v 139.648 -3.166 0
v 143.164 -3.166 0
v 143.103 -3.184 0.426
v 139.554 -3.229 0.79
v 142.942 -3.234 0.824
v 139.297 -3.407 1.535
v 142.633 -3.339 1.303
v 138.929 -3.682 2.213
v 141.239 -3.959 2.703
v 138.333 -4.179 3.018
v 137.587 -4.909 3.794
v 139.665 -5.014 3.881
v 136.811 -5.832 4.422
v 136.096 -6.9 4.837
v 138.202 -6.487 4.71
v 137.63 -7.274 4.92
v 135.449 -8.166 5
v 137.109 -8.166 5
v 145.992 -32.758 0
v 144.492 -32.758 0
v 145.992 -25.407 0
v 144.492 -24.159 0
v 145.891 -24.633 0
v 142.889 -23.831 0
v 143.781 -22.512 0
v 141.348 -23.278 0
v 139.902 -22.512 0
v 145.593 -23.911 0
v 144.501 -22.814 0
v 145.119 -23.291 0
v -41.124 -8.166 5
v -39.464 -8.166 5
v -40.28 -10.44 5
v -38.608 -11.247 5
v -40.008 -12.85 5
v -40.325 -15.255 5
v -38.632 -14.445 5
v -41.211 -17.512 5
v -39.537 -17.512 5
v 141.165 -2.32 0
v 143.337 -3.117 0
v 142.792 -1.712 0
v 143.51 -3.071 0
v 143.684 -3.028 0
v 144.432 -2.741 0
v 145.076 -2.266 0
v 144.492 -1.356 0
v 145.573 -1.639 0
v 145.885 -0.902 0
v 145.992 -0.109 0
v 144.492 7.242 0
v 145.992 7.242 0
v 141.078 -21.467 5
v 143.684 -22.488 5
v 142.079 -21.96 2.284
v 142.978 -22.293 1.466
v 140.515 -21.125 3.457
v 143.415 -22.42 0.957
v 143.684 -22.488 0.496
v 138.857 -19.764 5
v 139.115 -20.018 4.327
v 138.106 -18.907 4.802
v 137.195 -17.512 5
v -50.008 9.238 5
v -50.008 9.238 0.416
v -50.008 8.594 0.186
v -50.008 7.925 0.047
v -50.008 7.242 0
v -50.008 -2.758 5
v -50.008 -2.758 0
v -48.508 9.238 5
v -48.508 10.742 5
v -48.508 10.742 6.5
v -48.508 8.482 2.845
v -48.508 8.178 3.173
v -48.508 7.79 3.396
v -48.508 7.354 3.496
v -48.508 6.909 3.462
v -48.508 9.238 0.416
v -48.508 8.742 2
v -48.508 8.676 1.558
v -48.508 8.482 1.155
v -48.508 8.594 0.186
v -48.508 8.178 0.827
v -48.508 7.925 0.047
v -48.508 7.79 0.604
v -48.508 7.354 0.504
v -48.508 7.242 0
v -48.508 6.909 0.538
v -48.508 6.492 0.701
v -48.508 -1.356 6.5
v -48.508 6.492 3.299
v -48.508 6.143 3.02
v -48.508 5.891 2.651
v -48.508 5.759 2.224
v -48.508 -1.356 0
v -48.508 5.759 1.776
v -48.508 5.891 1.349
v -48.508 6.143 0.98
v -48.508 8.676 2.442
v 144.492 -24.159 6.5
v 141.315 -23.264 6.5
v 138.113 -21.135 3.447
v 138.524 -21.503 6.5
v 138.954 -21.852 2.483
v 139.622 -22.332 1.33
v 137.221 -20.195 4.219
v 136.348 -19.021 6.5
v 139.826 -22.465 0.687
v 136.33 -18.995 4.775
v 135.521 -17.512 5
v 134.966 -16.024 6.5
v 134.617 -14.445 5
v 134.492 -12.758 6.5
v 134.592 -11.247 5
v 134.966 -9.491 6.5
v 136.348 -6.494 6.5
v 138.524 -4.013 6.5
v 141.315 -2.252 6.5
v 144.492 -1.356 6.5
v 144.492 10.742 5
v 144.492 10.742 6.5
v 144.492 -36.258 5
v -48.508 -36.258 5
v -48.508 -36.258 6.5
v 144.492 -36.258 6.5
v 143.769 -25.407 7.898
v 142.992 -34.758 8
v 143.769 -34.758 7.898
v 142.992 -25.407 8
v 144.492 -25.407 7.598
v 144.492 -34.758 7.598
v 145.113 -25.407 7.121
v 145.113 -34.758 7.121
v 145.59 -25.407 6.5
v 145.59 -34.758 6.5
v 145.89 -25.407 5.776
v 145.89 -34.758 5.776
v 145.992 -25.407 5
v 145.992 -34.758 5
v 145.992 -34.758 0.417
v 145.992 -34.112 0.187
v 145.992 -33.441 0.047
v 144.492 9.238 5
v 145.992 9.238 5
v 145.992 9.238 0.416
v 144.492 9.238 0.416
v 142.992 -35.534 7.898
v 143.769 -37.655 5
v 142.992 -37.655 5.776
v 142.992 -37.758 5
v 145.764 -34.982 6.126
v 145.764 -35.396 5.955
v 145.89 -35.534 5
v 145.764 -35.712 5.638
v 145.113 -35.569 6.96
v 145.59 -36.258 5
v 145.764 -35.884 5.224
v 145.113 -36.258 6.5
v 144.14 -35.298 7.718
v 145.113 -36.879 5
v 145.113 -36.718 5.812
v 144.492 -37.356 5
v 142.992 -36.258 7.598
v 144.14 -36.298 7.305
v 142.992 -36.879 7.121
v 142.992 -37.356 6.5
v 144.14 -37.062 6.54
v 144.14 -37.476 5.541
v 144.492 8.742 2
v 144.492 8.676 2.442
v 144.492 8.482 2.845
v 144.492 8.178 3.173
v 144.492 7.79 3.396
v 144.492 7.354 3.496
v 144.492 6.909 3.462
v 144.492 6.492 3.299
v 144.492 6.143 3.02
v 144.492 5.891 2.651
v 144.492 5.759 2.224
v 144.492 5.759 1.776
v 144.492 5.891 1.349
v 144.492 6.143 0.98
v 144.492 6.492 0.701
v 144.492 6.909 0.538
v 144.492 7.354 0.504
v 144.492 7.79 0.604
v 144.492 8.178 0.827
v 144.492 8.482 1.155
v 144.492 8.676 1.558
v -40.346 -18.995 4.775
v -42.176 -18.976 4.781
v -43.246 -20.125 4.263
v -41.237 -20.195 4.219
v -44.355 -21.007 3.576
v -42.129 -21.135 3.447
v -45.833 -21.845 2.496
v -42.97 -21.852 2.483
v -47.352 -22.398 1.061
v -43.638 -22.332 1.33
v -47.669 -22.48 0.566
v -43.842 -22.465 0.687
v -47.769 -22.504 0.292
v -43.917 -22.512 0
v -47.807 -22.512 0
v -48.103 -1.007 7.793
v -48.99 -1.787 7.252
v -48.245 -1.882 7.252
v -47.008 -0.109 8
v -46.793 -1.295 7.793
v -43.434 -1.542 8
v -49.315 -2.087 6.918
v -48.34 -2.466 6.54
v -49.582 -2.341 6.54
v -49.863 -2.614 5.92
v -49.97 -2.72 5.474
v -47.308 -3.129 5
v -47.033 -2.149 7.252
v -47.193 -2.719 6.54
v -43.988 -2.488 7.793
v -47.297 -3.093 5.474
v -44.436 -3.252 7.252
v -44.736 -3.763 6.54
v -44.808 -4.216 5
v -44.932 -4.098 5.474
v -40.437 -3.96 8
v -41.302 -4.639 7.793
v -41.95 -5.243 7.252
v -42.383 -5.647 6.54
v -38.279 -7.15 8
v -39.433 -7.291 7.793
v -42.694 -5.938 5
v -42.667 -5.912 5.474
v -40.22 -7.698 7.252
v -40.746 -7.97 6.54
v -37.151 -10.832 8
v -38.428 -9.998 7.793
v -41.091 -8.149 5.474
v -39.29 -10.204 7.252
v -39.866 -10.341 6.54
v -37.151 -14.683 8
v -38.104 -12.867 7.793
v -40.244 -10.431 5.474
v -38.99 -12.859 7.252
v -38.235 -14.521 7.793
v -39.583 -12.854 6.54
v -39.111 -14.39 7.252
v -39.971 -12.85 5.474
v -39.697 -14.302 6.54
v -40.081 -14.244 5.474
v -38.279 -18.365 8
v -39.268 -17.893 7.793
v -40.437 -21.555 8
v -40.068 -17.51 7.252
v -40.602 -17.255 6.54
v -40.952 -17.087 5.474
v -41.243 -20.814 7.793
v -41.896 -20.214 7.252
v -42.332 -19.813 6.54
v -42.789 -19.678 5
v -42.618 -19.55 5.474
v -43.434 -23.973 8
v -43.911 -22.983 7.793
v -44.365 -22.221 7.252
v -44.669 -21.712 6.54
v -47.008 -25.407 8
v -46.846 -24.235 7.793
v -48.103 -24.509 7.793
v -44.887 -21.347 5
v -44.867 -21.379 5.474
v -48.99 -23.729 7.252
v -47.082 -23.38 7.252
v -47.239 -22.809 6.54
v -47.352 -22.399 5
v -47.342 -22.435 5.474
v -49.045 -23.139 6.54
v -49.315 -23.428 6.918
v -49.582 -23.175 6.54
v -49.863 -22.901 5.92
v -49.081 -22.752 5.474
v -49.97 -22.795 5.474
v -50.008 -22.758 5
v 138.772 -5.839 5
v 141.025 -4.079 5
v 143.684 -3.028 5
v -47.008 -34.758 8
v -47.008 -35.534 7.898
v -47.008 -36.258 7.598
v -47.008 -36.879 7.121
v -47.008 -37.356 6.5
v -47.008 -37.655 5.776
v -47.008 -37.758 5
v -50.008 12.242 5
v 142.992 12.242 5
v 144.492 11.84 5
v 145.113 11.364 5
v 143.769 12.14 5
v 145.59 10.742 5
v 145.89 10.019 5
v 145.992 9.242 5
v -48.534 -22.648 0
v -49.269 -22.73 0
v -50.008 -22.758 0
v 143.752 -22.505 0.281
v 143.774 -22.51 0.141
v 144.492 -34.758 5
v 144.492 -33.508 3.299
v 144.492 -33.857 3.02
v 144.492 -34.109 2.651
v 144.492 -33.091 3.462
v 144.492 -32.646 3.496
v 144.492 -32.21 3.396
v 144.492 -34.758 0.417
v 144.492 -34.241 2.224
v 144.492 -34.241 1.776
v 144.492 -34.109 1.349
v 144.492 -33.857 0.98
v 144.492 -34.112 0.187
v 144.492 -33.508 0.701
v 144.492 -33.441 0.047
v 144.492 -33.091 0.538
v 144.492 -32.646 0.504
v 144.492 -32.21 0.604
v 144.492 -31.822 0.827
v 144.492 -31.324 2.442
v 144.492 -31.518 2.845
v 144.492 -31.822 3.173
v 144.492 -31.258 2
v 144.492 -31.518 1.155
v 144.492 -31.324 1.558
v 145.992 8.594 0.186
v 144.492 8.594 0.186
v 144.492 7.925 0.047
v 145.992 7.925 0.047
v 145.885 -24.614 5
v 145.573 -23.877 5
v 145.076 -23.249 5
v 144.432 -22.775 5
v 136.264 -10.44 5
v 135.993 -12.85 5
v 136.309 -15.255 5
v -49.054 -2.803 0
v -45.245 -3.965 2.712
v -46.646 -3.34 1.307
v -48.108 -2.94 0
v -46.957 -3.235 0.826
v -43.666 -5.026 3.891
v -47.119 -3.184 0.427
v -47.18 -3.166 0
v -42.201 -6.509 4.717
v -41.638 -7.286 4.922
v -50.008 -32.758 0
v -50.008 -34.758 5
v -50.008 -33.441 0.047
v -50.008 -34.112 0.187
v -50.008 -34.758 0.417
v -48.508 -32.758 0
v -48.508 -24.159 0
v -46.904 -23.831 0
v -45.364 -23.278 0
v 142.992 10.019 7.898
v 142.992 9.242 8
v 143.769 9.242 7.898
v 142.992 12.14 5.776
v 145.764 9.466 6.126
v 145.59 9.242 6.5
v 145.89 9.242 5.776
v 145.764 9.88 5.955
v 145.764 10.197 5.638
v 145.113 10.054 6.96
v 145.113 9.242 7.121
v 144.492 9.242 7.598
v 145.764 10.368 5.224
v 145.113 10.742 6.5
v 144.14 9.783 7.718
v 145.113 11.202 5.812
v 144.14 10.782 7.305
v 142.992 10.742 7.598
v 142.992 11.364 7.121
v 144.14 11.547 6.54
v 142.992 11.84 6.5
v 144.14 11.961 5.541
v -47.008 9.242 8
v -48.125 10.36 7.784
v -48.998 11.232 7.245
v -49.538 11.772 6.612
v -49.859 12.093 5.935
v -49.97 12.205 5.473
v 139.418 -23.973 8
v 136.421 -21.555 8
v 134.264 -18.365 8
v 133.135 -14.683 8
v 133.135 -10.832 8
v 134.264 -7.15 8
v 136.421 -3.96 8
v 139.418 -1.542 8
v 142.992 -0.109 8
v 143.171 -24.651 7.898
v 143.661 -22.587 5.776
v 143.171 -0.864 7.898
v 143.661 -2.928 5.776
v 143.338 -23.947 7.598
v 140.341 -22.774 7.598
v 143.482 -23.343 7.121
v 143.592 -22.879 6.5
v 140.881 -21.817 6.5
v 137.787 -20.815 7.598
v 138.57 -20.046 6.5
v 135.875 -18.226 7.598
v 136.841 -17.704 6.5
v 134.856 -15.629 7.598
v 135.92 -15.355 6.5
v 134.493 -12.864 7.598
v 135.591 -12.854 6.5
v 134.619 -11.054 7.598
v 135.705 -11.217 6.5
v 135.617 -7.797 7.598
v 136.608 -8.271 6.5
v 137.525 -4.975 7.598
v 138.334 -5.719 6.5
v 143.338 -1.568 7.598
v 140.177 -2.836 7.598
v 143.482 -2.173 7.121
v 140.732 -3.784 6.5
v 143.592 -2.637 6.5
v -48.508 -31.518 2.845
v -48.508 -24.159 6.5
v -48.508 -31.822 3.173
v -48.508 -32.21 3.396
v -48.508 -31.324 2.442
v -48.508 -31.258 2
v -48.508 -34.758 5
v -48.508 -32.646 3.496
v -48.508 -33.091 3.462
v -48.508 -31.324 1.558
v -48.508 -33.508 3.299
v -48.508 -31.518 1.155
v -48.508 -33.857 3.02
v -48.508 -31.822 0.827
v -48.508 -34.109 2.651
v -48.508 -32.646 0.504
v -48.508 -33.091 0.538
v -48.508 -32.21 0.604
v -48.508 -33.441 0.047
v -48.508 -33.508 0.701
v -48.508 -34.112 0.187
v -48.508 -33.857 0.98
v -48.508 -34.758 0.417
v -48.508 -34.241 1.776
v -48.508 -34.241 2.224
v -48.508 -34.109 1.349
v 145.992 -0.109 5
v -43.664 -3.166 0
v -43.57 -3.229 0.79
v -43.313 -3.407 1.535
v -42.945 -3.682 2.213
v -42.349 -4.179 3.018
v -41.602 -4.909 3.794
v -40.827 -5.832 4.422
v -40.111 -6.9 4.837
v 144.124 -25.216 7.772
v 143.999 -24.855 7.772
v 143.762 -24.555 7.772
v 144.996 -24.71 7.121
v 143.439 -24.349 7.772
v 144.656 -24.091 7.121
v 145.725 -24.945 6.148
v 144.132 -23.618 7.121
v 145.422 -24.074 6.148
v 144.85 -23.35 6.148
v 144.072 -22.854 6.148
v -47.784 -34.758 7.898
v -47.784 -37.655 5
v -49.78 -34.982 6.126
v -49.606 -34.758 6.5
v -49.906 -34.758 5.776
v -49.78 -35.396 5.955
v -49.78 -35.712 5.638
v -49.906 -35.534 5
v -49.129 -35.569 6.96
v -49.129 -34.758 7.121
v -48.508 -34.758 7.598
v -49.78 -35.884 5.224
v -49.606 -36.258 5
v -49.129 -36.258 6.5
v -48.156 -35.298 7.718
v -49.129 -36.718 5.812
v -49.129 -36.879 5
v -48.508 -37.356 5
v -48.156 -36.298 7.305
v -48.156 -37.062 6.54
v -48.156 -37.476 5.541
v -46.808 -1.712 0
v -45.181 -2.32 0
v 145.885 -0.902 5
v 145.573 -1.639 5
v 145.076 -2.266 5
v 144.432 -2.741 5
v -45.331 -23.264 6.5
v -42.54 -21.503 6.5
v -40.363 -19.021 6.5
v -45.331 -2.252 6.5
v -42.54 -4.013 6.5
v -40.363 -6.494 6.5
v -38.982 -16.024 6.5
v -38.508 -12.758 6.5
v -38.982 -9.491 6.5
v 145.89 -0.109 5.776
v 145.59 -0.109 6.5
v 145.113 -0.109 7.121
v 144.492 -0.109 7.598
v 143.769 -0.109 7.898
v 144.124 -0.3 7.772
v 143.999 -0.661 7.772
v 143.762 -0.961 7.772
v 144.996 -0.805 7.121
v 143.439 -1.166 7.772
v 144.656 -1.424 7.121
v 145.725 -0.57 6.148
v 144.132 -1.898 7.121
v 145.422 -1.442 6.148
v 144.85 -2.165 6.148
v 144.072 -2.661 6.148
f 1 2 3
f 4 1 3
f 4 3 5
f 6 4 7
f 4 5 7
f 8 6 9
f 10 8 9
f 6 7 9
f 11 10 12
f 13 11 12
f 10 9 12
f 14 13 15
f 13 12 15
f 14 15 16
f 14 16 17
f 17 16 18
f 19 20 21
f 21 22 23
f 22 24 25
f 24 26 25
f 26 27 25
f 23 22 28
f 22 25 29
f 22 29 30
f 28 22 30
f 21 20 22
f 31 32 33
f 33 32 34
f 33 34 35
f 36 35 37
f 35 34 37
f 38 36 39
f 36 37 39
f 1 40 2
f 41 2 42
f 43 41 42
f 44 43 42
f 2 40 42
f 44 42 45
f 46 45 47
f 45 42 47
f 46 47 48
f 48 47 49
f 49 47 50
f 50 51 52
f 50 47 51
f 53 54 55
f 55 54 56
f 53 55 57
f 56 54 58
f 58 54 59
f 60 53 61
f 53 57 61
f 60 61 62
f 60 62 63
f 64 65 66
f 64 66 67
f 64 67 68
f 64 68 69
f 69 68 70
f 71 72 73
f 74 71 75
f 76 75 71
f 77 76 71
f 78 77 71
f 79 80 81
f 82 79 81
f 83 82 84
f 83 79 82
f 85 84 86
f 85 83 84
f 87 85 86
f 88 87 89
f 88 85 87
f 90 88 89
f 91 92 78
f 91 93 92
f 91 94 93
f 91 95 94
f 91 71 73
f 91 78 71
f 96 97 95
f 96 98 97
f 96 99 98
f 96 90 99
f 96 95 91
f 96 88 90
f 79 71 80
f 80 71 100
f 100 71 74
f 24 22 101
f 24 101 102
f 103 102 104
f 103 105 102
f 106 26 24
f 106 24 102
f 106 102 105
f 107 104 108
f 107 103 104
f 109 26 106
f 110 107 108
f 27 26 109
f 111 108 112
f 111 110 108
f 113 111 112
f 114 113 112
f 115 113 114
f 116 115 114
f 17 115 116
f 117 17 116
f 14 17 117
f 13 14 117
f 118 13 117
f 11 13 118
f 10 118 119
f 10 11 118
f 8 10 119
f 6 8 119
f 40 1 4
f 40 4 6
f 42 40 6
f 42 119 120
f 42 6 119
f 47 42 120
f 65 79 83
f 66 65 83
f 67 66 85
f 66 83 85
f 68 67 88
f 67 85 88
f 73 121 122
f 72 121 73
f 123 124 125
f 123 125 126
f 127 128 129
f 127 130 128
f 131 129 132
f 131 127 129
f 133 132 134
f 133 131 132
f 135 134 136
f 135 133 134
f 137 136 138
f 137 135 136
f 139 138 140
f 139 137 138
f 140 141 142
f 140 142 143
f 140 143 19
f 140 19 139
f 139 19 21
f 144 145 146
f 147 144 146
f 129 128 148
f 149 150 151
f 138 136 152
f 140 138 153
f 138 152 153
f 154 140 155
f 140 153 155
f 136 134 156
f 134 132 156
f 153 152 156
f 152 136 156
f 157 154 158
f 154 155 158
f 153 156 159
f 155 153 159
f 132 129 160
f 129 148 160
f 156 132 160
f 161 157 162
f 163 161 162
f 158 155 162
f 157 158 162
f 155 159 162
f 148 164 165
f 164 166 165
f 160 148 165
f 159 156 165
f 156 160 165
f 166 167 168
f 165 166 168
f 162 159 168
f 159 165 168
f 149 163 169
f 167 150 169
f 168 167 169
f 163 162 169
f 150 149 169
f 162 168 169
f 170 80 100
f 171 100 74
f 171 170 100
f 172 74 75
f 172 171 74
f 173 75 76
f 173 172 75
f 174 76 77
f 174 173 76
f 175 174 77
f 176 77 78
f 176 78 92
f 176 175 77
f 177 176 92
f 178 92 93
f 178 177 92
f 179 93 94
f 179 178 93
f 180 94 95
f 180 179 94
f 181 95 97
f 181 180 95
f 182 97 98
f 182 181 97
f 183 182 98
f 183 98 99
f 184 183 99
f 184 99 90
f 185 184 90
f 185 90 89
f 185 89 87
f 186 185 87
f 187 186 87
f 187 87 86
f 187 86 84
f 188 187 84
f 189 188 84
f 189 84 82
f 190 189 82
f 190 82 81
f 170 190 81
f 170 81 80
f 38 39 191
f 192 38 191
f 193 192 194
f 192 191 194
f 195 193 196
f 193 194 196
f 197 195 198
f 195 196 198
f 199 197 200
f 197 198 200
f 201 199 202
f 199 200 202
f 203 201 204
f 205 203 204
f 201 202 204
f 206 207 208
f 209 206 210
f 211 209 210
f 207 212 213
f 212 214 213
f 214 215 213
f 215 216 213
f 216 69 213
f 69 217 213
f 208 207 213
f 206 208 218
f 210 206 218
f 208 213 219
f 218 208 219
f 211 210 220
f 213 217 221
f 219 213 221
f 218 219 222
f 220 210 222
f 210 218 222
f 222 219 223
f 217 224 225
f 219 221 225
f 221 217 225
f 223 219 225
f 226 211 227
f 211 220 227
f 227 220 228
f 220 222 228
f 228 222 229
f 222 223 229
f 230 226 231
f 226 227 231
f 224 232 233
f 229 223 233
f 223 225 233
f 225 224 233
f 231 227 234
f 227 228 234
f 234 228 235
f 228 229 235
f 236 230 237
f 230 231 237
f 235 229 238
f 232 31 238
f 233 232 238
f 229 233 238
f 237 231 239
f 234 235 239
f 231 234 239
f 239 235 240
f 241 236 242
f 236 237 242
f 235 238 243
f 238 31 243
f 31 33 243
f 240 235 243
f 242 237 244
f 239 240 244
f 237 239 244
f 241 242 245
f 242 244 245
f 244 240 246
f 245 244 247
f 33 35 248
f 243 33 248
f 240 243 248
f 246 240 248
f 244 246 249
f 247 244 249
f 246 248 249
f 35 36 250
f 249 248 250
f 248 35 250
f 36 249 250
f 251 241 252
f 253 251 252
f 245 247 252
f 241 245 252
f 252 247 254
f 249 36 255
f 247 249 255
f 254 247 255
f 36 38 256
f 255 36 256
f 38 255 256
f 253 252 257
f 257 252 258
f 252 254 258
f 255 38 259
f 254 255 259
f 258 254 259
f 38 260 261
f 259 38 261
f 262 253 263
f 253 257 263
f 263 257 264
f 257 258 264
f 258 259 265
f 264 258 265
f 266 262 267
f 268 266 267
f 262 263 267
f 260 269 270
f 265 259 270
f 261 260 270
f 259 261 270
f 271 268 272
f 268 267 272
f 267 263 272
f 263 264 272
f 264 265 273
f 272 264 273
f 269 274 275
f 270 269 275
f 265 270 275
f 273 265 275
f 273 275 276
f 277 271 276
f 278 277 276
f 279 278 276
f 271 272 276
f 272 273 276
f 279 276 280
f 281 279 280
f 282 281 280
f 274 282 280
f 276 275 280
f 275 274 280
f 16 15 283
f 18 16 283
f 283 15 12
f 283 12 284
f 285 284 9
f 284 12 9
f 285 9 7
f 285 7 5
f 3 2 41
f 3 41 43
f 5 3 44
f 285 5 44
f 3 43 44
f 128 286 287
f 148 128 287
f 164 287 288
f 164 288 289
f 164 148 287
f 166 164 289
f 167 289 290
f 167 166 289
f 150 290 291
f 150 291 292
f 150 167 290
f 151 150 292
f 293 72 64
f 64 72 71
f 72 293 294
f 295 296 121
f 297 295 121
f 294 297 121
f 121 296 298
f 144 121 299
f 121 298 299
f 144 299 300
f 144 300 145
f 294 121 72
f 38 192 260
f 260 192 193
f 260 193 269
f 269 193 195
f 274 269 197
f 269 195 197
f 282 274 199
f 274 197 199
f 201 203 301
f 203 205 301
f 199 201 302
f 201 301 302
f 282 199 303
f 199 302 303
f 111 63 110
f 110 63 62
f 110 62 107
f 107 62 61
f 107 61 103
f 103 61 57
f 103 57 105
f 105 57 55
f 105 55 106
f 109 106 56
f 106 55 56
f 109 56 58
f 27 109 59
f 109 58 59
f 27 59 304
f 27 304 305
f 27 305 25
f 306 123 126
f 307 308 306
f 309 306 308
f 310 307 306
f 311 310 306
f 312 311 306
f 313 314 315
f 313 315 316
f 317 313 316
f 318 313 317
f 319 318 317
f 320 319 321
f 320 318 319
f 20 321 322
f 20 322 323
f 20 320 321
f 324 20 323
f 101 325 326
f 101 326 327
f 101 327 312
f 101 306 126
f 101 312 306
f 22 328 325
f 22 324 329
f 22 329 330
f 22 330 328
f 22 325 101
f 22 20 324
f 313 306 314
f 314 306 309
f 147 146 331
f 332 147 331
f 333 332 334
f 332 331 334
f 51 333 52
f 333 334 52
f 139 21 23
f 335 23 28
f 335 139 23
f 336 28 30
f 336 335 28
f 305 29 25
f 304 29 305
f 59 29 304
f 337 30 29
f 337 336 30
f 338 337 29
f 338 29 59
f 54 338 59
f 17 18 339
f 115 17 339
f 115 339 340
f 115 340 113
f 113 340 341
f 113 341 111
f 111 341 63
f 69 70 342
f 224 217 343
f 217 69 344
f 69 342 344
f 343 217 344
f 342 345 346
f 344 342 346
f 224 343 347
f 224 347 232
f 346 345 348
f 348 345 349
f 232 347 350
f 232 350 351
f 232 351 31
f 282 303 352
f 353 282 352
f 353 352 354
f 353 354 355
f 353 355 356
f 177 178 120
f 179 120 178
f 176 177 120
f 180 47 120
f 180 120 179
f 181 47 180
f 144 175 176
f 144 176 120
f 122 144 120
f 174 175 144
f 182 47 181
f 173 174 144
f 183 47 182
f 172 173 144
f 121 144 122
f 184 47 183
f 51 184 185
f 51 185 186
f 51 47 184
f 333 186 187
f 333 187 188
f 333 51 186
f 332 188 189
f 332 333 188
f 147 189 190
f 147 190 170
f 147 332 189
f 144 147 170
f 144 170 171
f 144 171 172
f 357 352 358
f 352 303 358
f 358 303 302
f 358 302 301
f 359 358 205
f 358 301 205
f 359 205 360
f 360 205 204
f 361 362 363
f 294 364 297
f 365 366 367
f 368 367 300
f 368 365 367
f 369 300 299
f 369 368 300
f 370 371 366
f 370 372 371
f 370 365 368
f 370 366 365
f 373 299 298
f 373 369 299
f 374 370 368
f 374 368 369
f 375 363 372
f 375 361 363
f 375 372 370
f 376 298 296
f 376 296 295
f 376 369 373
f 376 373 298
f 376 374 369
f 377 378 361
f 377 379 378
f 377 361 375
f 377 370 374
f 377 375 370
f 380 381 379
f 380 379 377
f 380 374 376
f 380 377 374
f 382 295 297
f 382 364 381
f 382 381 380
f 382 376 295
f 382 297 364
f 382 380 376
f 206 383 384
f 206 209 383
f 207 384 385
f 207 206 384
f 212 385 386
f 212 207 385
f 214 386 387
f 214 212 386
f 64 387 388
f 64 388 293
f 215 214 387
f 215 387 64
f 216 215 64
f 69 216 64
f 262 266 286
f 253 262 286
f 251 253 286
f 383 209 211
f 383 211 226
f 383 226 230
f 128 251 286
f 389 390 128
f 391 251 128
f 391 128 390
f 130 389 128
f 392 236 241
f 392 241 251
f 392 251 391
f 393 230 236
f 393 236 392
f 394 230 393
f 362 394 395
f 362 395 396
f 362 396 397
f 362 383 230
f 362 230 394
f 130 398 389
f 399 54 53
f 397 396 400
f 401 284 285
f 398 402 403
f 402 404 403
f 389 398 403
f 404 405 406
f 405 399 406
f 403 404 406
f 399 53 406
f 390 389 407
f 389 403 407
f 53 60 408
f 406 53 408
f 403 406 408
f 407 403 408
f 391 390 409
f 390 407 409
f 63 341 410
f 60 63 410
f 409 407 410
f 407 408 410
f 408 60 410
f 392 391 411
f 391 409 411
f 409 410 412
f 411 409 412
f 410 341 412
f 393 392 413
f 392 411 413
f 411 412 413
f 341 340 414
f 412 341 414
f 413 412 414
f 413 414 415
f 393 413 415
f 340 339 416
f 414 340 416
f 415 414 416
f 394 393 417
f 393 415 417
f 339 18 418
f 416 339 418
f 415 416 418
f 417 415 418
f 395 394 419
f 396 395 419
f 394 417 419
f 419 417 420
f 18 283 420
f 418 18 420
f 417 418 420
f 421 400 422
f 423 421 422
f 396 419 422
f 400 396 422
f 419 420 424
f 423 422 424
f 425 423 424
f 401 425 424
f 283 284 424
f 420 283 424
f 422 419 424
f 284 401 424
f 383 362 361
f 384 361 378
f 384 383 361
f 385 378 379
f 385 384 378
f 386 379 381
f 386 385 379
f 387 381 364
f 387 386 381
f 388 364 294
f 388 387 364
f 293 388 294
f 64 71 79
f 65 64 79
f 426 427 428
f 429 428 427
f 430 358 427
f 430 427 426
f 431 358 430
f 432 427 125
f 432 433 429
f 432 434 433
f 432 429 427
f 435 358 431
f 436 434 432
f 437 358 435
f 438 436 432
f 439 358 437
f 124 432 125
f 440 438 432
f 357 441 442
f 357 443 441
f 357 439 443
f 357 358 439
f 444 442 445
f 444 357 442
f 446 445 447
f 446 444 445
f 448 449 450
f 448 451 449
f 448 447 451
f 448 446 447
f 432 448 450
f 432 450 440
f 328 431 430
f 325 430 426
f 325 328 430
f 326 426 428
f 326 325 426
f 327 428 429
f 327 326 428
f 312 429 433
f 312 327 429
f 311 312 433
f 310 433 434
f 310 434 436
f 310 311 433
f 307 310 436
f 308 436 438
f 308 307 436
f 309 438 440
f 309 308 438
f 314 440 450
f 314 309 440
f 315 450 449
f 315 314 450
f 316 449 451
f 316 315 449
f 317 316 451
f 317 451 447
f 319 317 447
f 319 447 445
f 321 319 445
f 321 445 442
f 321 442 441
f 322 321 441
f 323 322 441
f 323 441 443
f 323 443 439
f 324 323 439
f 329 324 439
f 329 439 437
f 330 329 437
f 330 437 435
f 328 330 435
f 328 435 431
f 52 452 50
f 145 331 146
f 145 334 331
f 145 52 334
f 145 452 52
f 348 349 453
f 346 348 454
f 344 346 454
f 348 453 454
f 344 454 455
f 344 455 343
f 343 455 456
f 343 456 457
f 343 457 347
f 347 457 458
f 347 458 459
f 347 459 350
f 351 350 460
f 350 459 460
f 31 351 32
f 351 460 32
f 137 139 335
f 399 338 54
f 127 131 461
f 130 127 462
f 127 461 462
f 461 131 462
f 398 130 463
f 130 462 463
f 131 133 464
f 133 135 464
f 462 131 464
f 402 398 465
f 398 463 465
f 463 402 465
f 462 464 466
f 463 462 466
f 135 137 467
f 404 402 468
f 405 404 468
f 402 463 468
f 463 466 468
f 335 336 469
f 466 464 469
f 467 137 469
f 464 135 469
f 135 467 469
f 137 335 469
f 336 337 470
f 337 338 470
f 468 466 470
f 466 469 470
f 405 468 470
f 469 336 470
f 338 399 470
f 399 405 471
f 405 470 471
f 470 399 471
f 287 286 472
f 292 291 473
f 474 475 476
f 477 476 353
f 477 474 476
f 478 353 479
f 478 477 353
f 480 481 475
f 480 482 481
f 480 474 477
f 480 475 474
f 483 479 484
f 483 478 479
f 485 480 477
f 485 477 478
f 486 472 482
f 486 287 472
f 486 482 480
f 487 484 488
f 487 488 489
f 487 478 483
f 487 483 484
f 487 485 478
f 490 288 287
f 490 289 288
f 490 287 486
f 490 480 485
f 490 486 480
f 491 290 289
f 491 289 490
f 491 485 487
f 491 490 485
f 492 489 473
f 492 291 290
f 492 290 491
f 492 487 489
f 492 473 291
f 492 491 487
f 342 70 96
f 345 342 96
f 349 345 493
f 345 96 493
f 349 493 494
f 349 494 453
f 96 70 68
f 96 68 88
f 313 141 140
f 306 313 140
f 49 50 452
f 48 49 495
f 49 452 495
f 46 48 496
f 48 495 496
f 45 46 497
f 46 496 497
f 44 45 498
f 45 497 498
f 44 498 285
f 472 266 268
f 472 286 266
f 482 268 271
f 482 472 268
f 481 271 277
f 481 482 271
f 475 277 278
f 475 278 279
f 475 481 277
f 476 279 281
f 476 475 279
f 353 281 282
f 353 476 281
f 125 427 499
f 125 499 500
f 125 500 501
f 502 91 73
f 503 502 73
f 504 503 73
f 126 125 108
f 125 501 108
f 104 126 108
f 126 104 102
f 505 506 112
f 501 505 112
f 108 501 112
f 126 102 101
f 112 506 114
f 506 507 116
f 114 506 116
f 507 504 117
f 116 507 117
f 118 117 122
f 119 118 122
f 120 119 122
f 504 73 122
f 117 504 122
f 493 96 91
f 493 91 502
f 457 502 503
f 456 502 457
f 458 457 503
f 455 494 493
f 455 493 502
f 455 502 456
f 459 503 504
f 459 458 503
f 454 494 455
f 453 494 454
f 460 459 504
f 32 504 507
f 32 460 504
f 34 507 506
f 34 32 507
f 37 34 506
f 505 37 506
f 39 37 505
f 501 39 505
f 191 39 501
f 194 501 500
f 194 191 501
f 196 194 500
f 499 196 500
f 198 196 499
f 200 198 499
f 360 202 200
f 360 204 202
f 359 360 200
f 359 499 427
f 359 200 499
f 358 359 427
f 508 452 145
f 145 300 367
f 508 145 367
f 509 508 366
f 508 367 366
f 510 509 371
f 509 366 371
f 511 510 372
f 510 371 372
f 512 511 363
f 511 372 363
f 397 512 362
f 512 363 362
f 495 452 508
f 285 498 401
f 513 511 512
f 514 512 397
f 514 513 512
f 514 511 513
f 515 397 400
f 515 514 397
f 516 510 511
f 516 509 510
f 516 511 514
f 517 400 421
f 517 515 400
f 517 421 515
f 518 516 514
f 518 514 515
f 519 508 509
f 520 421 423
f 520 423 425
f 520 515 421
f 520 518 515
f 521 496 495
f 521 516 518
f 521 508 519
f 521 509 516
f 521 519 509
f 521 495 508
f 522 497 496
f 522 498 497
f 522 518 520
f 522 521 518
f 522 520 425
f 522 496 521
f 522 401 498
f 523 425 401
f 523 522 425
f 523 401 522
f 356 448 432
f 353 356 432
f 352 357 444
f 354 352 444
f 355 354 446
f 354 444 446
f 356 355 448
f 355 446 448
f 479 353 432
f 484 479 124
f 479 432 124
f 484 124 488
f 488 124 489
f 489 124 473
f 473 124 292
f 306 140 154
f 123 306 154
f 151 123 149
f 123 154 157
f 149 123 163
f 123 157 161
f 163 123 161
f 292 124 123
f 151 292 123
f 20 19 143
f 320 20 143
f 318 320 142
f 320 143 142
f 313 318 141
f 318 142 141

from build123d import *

# Parameters (mm, degrees)
F1_DEPTH  = 8
F3_T      = -1.5
F2_R      = 1.5
F4_DEPTH  = 196
F6_DEPTH  = 196.001
F7_R      = 3
F9_DEPTH  = 196.001
F11_DEPTH = 196.001


with BuildPart() as f1:
    # F0 (on Top) → F1 (new body)
    with BuildSketch(Plane.XY):
        with BuildLine():
            Line((145.992111, 12.24232), (-50.007889, 12.24232))
            Line((-50.007889, 12.24232), (-50.007889, -2.75768))
            ThreePointArc((-50.007889, -2.75768), (-40.007889, -12.75768), (-50.007889, -22.75768))
            Line((-50.007889, -22.75768), (-50.007889, -37.75768))
            Line((-50.007889, -37.75768), (145.992111, -37.75768))
            Line((145.992111, -37.75768), (145.992111, -22.75768))
            ThreePointArc((145.992111, -22.75768), (135.992111, -12.75768), (145.992111, -2.75768))
            Line((145.992111, -2.75768), (145.992111, 12.24232))
        make_face()
    extrude(amount=F1_DEPTH)

    # F3
    f3_openings = [f1.faces().sort_by_distance(p)[0] for p in [
        (47.992111, -12.75768, 0),
    ]]
    offset(amount=F3_T, openings=f3_openings)

    # F2 (on face) → F4 (join, through all)
    with BuildSketch(Plane.YZ.offset(145.992111)):
        with Locations((7.24232, 2)):
            Circle(F2_R)
        with Locations((-32.75768, 2)):
            Circle(F2_R)
    extrude(amount=-F4_DEPTH)

    # F5 (on face) → F6 (cut, through all)
    with BuildSketch(Plane(origin=(-50.007889, 0, 0), x_dir=(0, -1, 0), z_dir=(-1, 0, 0))):
        with BuildLine():
            ThreePointArc((-15.24232, 1.255437), (-17.447156, 3.75963), (-18.24232, 7))
            Line((-18.24232, 7), (-18.24232, 0.071797))
            ThreePointArc((-18.24232, 0.071797), (-16.673224, 0.488491), (-15.24232, 1.255437))
        make_face()
        with BuildLine():
            ThreePointArc((-12.24232, 7), (-13.037483, 3.75963), (-15.24232, 1.255437))
            ThreePointArc((-15.24232, 1.255437), (-13.811415, 0.488491), (-12.24232, 0.071797))
            Line((-12.24232, 0.071797), (-12.24232, 7))
        make_face()
        with BuildLine():
            ThreePointArc((-12.24232, 0.071797), (-13.811415, 0.488491), (-15.24232, 1.255437))
            ThreePointArc((-15.24232, 1.255437), (-16.673224, 0.488491), (-18.24232, 0.071797))
            Line((-18.24232, 0.071797), (-18.24232, 0))
            Line((-18.24232, 0), (-12.24232, 0))
            Line((-12.24232, 0), (-12.24232, 0.071797))
        make_face()
        with BuildLine():
            Line((-18.24232, 0), (-18.24232, 0.071797))
            ThreePointArc((-18.24232, 0.071797), (-18.741033, 0.017972), (-19.24232, 0))
            Line((-19.24232, 0), (-18.24232, 0))
        make_face()
        with BuildLine():
            ThreePointArc((-11.24232, 0), (-11.743607, 0.017972), (-12.24232, 0.071797))
            Line((-12.24232, 0.071797), (-12.24232, 0))
            Line((-12.24232, 0), (-11.24232, 0))
        make_face()
    extrude(amount=-F6_DEPTH, mode=Mode.SUBTRACT)

    # F7
    f7_edges = [f1.edges().sort_by_distance(p)[0] for p in [
        (47.992111, -37.75768, 8),
        (47.992111, 12.24232, 8),
        (145.992111, 4.74232, 8),
        (145.992111, -30.25768, 8),
        (135.992111, -12.75768, 8),
        (-50.007889, 4.74232, 8),
        (-40.007889, -12.75768, 8),
        (-50.007889, -30.25768, 8),
        (145.992111, -37.75768, 4),
        (145.992111, 12.24232, 4.035898),
        (-50.007889, -37.75768, 4),
        (145.992111, -2.75768, 4),
        (145.992111, -22.75768, 4),
    ]]
    fillet(f7_edges, radius=F7_R)

    # F8 (on face) → F9 (cut, through all)
    with BuildSketch(Plane.YZ.offset(145.992111)):
        with BuildLine():
            ThreePointArc((-17.512412, 5), (-21.047946, 3.535534), (-22.512412, 0))
            Line((-22.512412, 0), (-3.16584, 0))
            ThreePointArc((-3.16584, 0), (-4.630306, 3.535534), (-8.16584, 5))
            Line((-8.16584, 5), (-17.512412, 5))
        make_face()
    extrude(amount=-F9_DEPTH, mode=Mode.SUBTRACT)

    # F10 (on face) → F11 (cut, through all)
    with BuildSketch(Plane.YZ.offset(145.992111)):
        with BuildLine():
            ThreePointArc((-32.75768, 0), (-33.779229, 0.105468), (-34.75768, 0.417424))
            Line((-34.75768, 0.417424), (-34.75768, 5))
            Line((-34.75768, 5), (-37.75768, 5))
            Line((-37.75768, 5), (-37.75768, 0))
            Line((-37.75768, 0), (-32.75768, 0))
        make_face()
        with BuildLine():
            Line((7.24232, 0), (7.751559, 0))
            Line((7.751559, 0), (12.24232, 0))
            Line((12.24232, 0), (12.24232, 5))
            Line((12.24232, 5), (9.238324, 5))
            Line((9.238324, 5), (9.238324, 0.415683))
            ThreePointArc((9.238324, 0.415683), (8.261734, 0.105024), (7.24232, 0))
        make_face()
    extrude(amount=-F11_DEPTH, mode=Mode.SUBTRACT)


solid = f1.part
